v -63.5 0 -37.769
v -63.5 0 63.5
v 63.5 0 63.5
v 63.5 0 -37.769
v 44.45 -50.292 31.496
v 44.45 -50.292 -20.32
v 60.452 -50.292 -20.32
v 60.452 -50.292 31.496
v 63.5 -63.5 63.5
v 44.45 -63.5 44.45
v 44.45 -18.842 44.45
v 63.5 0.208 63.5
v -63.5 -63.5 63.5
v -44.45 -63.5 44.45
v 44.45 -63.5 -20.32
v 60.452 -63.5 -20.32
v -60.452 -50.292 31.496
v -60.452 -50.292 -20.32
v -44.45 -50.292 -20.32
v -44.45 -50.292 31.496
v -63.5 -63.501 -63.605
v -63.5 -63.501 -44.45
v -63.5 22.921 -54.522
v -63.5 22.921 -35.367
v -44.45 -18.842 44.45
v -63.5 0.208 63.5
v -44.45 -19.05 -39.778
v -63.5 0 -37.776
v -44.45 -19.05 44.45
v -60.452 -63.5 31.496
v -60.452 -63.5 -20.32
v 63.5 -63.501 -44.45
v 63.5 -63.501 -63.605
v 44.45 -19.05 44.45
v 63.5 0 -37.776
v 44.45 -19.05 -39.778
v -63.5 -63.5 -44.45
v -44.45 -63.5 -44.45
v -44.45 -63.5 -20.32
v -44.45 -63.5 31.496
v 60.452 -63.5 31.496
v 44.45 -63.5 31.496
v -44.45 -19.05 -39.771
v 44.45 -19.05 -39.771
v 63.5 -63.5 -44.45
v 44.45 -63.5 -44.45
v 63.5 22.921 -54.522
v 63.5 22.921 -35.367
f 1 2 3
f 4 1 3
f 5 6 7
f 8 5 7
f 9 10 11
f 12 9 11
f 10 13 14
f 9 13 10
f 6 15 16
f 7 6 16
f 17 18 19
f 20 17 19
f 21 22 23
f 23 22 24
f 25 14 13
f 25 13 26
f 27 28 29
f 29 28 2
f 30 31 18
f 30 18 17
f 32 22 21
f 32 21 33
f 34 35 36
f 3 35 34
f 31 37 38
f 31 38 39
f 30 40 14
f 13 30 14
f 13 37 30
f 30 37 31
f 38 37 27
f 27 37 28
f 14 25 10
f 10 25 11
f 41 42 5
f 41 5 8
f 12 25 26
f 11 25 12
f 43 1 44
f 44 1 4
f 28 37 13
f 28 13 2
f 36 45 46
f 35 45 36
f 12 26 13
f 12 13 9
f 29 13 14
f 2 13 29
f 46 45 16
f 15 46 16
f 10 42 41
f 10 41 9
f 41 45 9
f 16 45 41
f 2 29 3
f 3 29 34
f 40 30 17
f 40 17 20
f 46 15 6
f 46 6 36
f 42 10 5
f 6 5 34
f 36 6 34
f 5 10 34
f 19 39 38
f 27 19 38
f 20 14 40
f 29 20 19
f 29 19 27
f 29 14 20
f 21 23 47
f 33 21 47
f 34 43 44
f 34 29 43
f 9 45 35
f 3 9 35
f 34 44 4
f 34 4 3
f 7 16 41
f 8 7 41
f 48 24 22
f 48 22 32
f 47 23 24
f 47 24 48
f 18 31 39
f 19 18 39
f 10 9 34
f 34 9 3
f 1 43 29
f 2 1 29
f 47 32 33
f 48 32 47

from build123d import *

# Parameters (mm, degrees)
F4_W        = 127
F4_H        = 103.27132
F5_DEPTH    = 19.05
F6_SIZE2    = 19.04999
F6_SIZE     = 19.04999
F7_SIZE2    = 2.002226
F7_SIZE     = 19.04999
F8_W        = 63.5
F8_H        = 107.95
F9_DEPTH    = 19.05
F10_SIZE2   = 6.674109
F10_SIZE    = 63.49999
F11_SIZE2   = 19.04999
F11_SIZE    = 19.04999
F12_W       = 63.5
F12_H       = 107.95
F13_DEPTH   = 19.05
F14_SIZE2   = 6.674109
F14_SIZE    = 63.49999
F15_SIZE2   = 19.04999
F15_SIZE    = 19.04999
F16_W       = 127
F16_H       = 63.7083128998
F17_DEPTH   = 19.05
F18_SIZE2   = 19.04999
F18_SIZE    = 19.04999
F20_W       = 127
F20_H       = 88.9
F21_DEPTH   = 19.05
F22_SIZE2   = 2.002226
F22_SIZE    = 19.04999
F22_2_SIZE2 = 2.002226
F22_2_SIZE  = 19.04999
F23_W       = 120.904
F23_H       = 51.816
F24_DEPTH   = 13.208


# Not quite as in the source:
# - a fillet or chamfer is up to 0.001 mm smaller than in the source, because OpenCascade refuses the exact size


with BuildPart() as f5:
    # F4 (on Front) → F5 (new body)
    with BuildSketch(Plane.XZ):
        with Locations((0, 11.86434)):
            Rectangle(F4_W, F4_H)
    extrude(amount=F5_DEPTH)

    # F6 (size 19.05 and 19.05 in the source; OpenCascade refuses exactly that, so slightly less here)
    f6_edges = [f5.edges().sort_by_distance(p)[0] for p in [
        (63.5, -19.05, 11.86434),
        (0, -19.05, 63.5),
        (-63.5, -19.05, 11.86434),
    ]]
    chamfer(f6_edges, length=F6_SIZE, length2=F6_SIZE2)

    # F7 (size 19.05 and 2.0022356818 in the source; OpenCascade refuses exactly that, so slightly less here)
    f7_edges = [f5.edges().sort_by_distance(p)[0] for p in [
        (0, 0, -39.77132),
    ]]
    f7_side = f5.faces().sort_by_distance((0, -8.964706, -39.77132))[0]
    chamfer(f7_edges, length=F7_SIZE, length2=F7_SIZE2, reference=f7_side)


with BuildPart() as f9:
    # F8 (on offset) → F9 (new body)
    with BuildSketch(Plane.YZ.offset(-63.5)):
        with Locations((-31.75, 9.525)):
            Rectangle(F8_W, F8_H)
    extrude(amount=F9_DEPTH)

    # F10 (size 63.5 and 6.6741189394 in the source; OpenCascade refuses exactly that, so slightly less here)
    f10_edges = [f9.edges().sort_by_distance(p)[0] for p in [
        (-53.975, 0, -44.45),
    ]]
    f10_side = f9.faces().sort_by_distance((-53.975, -31.75, -44.45))[0]
    chamfer(f10_edges, length=F10_SIZE, length2=F10_SIZE2, reference=f10_side)

    # F11 (size 19.05 and 19.05 in the source; OpenCascade refuses exactly that, so slightly less here)
    f11_edges = [f9.edges().sort_by_distance(p)[0] for p in [
        (-44.45, 0, 12.862054),
        (-44.45, -31.75, 63.5),
    ]]
    chamfer(f11_edges, length=F11_SIZE, length2=F11_SIZE2)


with BuildPart() as f13:
    # F12 (on offset) → F13 (new body)
    with BuildSketch(Plane.YZ.offset(63.5)):
        with Locations((-31.75, 9.525)):
            Rectangle(F12_W, F12_H)
    extrude(amount=-F13_DEPTH)

    # F14 (size 63.5 and 6.6741189394 in the source; OpenCascade refuses exactly that, so slightly less here)
    f14_edges = [f13.edges().sort_by_distance(p)[0] for p in [
        (53.975, 0, -44.45),
    ]]
    f14_side = f13.faces().sort_by_distance((53.975, -31.75, -44.45))[0]
    chamfer(f14_edges, length=F14_SIZE, length2=F14_SIZE2, reference=f14_side)

    # F15 (size 19.05 and 19.05 in the source; OpenCascade refuses exactly that, so slightly less here)
    f15_edges = [f13.edges().sort_by_distance(p)[0] for p in [
        (44.45, 0, 12.862054),
        (44.45, -31.75, 63.5),
    ]]
    chamfer(f15_edges, length=F15_SIZE, length2=F15_SIZE2)


with BuildPart() as f17:
    # F16 (on offset) → F17 (new body)
    with BuildSketch(Plane.XY.offset(63.5)):
        with Locations((0, -31.6458435501)):
            Rectangle(F16_W, F16_H)
    extrude(amount=-F17_DEPTH)

    # F18 (size 19.05 and 19.05 in the source; OpenCascade refuses exactly that, so slightly less here)
    f18_edges = [f17.edges().sort_by_distance(p)[0] for p in [
        (0, 0.208313, 44.45),
        (63.5, -31.645844, 44.45),
        (-63.5, -31.645844, 44.45),
    ]]
    chamfer(f18_edges, length=F18_SIZE, length2=F18_SIZE2)


with BuildPart() as f21:
    # F20 (on face) → F21 (new body)
    with BuildSketch(Plane(origin=(0, 3.9270236517, -37.3631342428), x_dir=(1, 0, 0), z_dir=(0, -0.1045284633, 0.9945218954))):
        with Locations((0, -25.3512205481)):
            Rectangle(F20_W, F20_H)
    extrude(amount=-F21_DEPTH)

    # F22 (size 19.05 and 2.0022356818 in the source; OpenCascade refuses exactly that, so slightly less here)
    f22_edges = [f21.edges().sort_by_distance(p)[0] for p in [
        (0, -65.491819, -44.659349),
    ]]
    f22_side = f21.faces().sort_by_distance((0, -64.496185, -54.13217))[0]
    chamfer(f22_edges, length=F22_SIZE, length2=F22_SIZE2, reference=f22_side)

    # F22#2 (size 19.05 and 2.0022356818 in the source; OpenCascade refuses exactly that, so slightly less here)
    f22_2_edges = [f21.edges().sort_by_distance(p)[0] for p in [
        (0, 24.912445, -54.31241),
    ]]
    f22_2_side = f21.faces().sort_by_distance((0, 23.916812, -44.839589))[0]
    chamfer(f22_2_edges, length=F22_2_SIZE, length2=F22_2_SIZE2, reference=f22_2_side)


with BuildPart() as f24:
    # F23 (on offset) → F24 (new body)
    with BuildSketch(Plane.XZ.offset(63.5)):
        with Locations((0, 5.588)):
            Rectangle(F23_W, F23_H)
    extrude(amount=-F24_DEPTH)


with BuildPart() as f13_1:
    add(f13.part)

    # F25: cut F24
    add(f24.part, mode=Mode.SUBTRACT)


with BuildPart() as f9_1:
    add(f9.part)

    # F25: cut F24
    add(f24.part, mode=Mode.SUBTRACT)


solid = Compound([f5.part, f17.part, f21.part, f13_1.part, f9_1.part])
